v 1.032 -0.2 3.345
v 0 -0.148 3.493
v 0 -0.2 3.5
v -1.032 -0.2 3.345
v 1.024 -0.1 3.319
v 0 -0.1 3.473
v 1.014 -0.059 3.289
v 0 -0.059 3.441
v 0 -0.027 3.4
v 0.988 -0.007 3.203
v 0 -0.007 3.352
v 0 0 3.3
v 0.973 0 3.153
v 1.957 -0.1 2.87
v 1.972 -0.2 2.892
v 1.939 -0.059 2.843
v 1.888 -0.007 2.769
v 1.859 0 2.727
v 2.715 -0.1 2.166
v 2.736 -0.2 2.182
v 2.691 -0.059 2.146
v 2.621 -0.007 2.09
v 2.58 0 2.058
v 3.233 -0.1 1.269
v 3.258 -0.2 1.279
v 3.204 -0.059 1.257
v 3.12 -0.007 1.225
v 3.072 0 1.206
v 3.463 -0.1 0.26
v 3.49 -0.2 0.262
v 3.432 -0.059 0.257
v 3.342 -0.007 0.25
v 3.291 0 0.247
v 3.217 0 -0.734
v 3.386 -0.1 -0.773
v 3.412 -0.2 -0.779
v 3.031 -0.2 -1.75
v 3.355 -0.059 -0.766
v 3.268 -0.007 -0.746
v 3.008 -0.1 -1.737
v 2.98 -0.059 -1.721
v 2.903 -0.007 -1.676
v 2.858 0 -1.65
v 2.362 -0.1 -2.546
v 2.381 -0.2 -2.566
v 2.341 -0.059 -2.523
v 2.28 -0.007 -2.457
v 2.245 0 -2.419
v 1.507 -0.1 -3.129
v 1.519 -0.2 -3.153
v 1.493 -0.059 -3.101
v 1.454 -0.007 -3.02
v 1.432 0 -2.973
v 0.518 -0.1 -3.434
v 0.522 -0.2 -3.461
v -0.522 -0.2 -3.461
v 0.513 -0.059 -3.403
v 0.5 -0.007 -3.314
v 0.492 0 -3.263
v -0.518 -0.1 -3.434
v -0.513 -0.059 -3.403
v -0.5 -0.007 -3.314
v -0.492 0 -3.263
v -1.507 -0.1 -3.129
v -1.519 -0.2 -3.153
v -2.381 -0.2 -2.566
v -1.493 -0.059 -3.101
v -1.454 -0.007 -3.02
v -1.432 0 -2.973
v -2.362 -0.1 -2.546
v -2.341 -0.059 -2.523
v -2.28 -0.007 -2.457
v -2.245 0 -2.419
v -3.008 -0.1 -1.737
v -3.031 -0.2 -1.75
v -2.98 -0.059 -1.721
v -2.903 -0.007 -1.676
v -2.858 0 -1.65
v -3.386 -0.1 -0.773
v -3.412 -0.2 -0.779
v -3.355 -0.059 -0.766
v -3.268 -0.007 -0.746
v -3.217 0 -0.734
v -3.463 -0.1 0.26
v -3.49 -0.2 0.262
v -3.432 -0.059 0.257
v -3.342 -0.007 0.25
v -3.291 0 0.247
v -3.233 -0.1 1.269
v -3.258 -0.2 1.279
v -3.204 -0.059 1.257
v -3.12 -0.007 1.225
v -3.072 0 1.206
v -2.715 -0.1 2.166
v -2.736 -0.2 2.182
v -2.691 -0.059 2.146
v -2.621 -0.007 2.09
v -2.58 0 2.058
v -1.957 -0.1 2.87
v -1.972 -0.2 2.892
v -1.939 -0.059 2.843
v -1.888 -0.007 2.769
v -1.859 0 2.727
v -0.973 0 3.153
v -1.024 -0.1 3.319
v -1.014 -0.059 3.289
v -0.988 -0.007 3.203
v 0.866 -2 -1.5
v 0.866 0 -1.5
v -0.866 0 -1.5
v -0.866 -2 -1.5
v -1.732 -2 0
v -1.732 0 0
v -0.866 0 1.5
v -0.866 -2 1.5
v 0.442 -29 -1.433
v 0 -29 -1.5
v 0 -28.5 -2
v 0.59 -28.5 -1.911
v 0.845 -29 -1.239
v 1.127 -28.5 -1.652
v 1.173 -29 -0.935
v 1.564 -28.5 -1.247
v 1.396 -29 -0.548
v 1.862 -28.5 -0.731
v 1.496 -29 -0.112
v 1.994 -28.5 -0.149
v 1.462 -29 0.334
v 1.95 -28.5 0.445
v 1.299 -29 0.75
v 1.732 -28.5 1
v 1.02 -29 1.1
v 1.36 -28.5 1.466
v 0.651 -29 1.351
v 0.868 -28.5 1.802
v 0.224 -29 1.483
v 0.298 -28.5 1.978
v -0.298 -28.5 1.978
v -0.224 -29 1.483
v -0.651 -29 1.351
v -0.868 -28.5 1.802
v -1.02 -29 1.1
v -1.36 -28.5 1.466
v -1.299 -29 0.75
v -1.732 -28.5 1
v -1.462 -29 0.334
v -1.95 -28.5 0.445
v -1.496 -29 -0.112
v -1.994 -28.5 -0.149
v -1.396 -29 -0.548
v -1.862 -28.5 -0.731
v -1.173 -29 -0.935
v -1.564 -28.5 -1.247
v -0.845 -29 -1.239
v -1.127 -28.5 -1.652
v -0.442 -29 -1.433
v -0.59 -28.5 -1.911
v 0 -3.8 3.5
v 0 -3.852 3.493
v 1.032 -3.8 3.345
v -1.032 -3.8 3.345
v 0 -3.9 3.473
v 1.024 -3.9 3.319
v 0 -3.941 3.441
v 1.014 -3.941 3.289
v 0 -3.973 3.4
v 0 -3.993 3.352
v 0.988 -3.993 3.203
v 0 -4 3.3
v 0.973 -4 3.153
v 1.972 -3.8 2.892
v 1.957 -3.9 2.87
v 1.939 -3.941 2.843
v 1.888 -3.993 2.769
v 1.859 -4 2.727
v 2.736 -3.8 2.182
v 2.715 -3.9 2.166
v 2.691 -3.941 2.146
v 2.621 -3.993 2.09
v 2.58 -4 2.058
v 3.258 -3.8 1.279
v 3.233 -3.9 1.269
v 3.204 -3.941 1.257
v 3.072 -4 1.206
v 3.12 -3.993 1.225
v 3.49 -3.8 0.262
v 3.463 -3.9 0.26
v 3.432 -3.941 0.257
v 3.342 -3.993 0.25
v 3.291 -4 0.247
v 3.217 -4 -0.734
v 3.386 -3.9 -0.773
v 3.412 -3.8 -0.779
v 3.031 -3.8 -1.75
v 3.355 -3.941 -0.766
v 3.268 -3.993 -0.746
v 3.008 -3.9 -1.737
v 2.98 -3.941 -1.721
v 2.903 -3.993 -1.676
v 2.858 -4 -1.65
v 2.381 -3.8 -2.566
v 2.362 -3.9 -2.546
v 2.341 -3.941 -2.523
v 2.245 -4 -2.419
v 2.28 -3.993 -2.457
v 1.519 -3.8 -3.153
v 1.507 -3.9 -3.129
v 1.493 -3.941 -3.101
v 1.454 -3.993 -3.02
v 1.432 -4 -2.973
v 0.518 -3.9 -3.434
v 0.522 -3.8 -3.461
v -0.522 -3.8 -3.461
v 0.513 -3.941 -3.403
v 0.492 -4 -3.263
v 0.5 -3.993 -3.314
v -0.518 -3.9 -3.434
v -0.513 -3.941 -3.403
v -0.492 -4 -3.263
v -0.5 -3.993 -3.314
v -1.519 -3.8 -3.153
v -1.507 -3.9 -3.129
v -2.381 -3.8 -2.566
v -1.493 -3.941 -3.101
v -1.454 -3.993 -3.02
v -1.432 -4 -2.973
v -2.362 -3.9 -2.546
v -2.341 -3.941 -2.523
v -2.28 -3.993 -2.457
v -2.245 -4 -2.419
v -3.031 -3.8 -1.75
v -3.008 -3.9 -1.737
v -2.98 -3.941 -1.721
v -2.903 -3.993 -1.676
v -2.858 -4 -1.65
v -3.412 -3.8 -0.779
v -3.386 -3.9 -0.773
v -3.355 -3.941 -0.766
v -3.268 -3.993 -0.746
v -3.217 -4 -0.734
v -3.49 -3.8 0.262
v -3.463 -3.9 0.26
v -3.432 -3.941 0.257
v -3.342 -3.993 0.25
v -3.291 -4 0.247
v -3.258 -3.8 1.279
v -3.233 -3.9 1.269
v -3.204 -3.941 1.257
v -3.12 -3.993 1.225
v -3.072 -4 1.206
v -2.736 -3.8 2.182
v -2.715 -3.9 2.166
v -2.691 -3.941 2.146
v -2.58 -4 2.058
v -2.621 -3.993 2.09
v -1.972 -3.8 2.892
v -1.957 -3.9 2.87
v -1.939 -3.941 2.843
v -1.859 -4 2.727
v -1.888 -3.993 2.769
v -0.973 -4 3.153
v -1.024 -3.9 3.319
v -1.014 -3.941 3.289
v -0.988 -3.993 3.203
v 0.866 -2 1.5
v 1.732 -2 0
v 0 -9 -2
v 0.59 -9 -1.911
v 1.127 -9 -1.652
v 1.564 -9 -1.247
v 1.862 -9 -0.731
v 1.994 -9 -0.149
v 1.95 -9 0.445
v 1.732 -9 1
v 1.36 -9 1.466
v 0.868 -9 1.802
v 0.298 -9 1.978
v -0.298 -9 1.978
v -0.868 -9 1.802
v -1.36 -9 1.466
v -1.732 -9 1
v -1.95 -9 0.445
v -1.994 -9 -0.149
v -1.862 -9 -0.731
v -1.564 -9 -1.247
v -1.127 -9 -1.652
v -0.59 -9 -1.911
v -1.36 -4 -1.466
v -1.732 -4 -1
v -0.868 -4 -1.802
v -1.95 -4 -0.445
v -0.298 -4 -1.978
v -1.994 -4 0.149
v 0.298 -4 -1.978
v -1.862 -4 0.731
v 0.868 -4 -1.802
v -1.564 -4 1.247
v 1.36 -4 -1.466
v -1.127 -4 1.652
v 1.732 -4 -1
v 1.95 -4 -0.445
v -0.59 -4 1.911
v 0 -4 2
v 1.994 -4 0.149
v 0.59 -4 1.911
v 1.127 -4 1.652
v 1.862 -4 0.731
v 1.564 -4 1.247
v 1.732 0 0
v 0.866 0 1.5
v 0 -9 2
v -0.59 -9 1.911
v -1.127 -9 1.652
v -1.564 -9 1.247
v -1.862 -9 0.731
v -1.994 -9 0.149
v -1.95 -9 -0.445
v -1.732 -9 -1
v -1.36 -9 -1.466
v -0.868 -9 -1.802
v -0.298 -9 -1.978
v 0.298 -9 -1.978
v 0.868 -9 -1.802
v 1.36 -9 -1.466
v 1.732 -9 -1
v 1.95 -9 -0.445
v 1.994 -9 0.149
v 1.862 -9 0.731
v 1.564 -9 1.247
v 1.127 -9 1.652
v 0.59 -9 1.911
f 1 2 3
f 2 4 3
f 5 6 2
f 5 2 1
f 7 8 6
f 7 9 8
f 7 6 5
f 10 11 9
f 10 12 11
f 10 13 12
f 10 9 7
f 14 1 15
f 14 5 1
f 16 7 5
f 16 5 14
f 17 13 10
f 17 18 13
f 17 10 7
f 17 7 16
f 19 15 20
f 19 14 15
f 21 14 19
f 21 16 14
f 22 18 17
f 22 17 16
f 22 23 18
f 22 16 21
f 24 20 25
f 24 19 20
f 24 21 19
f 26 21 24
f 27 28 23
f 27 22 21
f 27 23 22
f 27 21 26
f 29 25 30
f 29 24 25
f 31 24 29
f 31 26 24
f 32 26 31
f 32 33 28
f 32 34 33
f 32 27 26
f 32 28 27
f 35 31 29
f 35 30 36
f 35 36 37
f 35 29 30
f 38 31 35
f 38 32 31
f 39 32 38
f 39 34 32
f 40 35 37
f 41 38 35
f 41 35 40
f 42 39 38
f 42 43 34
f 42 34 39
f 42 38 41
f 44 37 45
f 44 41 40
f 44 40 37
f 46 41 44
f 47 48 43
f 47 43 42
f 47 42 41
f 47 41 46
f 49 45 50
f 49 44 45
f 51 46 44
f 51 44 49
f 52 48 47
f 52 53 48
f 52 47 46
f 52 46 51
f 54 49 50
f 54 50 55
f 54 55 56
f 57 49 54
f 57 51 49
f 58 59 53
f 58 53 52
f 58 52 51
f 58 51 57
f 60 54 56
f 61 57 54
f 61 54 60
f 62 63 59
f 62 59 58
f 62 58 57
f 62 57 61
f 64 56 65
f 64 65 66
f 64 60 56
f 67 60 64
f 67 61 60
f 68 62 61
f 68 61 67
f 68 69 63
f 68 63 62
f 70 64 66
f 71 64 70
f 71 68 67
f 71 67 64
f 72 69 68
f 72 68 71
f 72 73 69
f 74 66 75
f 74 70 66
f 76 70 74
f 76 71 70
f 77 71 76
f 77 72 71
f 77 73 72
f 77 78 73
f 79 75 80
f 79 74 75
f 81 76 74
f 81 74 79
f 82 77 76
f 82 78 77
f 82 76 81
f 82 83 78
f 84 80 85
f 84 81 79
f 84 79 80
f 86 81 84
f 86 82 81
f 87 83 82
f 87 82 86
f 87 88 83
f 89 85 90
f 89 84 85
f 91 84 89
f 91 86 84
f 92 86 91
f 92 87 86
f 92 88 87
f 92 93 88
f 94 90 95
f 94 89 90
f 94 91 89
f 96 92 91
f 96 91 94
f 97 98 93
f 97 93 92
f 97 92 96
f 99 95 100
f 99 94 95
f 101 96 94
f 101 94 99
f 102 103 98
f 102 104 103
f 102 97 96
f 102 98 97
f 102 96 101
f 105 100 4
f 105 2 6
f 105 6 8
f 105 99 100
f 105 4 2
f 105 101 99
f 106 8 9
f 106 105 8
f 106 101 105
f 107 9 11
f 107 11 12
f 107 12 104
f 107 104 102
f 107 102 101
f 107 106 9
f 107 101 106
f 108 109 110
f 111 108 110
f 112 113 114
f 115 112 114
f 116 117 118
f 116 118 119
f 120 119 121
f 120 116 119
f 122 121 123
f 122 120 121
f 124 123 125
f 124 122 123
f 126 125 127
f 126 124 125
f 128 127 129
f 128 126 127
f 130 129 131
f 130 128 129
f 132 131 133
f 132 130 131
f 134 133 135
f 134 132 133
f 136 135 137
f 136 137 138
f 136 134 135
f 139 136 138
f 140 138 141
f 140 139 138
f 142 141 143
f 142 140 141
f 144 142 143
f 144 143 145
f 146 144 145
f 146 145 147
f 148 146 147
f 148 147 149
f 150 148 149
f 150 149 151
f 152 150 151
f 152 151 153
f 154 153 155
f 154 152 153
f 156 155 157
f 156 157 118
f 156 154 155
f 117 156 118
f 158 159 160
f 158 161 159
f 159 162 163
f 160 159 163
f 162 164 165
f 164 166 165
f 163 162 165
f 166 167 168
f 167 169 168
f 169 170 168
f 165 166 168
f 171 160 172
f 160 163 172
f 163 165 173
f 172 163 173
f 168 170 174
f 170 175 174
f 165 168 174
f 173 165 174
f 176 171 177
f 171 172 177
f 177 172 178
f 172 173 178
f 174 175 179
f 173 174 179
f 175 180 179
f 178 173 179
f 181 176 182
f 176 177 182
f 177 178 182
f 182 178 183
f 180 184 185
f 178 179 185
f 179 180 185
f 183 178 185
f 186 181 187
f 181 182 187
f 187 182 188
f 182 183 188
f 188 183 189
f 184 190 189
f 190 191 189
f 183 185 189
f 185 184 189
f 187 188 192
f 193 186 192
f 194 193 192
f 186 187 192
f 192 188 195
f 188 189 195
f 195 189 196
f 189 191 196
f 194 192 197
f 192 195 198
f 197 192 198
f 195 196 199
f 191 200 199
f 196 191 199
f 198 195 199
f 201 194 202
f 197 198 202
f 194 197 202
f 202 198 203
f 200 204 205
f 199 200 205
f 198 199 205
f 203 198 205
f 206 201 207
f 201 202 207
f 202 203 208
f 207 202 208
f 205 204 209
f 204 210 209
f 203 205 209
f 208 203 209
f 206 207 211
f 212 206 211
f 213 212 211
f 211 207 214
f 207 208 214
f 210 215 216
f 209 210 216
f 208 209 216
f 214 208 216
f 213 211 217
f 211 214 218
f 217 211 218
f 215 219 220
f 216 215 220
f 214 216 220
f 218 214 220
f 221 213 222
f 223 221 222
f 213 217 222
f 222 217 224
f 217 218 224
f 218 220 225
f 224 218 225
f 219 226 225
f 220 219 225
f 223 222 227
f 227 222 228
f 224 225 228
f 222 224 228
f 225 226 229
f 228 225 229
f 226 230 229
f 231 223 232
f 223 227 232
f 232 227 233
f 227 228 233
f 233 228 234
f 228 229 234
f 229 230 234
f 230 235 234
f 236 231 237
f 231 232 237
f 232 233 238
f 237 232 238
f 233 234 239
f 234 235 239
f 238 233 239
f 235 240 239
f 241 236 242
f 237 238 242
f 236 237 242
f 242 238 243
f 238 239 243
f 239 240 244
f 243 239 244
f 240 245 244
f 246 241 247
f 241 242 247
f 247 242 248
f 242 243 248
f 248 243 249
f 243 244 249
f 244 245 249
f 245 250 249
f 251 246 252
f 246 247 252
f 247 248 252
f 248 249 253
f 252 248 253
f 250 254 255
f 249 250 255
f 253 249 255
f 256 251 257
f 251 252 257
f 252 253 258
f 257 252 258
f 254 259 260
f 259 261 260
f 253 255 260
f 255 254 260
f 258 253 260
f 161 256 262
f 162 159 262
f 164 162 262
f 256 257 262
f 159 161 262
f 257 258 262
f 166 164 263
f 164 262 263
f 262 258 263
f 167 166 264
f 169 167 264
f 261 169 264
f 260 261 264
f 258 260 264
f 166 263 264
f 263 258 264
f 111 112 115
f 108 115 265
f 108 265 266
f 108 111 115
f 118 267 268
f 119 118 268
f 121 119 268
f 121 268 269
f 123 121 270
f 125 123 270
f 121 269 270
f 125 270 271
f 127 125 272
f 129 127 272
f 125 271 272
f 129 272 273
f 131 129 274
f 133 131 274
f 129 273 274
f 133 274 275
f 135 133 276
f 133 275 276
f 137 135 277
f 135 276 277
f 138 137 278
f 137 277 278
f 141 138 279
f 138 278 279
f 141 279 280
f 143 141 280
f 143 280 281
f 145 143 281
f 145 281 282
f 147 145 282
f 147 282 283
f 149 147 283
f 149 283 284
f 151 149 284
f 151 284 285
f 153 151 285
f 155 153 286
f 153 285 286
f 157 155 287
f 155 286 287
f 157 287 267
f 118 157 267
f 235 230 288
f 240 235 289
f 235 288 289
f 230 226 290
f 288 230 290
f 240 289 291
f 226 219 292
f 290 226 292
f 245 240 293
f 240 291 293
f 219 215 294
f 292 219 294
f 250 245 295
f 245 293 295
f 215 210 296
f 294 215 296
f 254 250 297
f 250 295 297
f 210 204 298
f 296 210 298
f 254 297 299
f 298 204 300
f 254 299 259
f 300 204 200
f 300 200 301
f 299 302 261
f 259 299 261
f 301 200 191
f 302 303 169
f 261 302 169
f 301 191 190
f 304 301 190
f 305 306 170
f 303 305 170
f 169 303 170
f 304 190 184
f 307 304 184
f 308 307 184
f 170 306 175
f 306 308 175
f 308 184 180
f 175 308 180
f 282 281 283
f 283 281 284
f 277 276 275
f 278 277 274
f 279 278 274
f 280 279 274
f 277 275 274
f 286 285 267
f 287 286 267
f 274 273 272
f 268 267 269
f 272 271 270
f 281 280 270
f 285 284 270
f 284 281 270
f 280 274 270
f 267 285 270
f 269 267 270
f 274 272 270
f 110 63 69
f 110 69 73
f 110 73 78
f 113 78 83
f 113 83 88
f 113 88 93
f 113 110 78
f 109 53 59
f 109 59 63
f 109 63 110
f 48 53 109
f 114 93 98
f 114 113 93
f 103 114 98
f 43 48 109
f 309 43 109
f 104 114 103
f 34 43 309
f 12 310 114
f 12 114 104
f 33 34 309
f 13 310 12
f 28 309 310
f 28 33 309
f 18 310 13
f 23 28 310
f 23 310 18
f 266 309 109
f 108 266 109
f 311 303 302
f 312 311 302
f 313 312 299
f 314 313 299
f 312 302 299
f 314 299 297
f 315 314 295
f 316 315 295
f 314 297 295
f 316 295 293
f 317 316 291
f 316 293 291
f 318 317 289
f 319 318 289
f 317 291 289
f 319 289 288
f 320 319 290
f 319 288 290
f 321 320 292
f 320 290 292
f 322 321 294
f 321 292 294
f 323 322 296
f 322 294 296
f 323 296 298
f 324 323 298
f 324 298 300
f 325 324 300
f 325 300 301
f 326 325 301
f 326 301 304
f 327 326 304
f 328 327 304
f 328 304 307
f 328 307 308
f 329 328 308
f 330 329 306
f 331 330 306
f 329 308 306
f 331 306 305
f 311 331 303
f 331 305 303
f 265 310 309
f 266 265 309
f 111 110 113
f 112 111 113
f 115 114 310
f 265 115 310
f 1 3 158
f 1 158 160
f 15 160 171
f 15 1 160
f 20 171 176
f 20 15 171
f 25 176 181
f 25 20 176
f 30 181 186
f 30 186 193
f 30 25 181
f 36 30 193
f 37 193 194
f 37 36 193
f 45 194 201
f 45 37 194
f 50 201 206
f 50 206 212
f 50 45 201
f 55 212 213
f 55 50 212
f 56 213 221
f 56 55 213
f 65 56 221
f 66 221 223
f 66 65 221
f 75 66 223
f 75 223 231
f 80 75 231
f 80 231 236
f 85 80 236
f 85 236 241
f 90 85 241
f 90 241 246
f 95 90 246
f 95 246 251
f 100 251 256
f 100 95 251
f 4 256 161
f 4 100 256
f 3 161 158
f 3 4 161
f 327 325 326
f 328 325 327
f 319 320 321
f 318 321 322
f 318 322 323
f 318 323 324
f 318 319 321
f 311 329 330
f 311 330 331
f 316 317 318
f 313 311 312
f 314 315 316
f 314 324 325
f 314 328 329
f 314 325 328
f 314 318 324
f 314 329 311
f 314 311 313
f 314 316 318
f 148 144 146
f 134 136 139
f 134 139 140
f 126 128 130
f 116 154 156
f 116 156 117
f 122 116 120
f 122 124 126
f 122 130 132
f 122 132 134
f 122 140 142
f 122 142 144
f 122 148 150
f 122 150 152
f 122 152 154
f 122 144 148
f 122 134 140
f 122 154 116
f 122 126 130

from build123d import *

# Parameters (mm, degrees)
SKETCH1_R           = 3.5
BOSS_EXTRUDE1_DEPTH = 4
CUT_EXTRUDE1_DEPTH  = 2
SKETCH3_R           = 2
BOSS_EXTRUDE2_DEPTH = 5
SKETCH4_R           = 2
BOSS_EXTRUDE3_DEPTH = 20
CHAMFER1_SIZE       = 0.5
FILLET1_R           = 0.2


with BuildPart() as part:
    # Sketch1 → Boss-Extrude1 (new body)
    with BuildSketch(Plane(origin=(0, 0, 0), x_dir=(1, 0, 0), z_dir=(0, 1, 0))):
        with Locations(Location((0, 0, 0), (0, 0, 270))):
            Circle(SKETCH1_R)
    extrude(amount=-BOSS_EXTRUDE1_DEPTH)

    # Sketch2 → Cut-Extrude1 (cut)
    with BuildSketch(Plane(origin=(0, 0, 0), x_dir=(1, 0, 0), z_dir=(0, 1, 0))):
        Polygon((1.732050808, 0), (0.866025404, 1.5), (-0.866025404, 1.5), (-1.732050808, 0), (-0.866025404, -1.5), (0.866025404, -1.5), align=None)
    extrude(amount=-CUT_EXTRUDE1_DEPTH, mode=Mode.SUBTRACT)

    # Sketch3 → Boss-Extrude2 (add)
    with BuildSketch(Plane.XZ.offset(4)):
        with Locations(Location((0, 0, 0), (0, 0, 90))):
            Circle(SKETCH3_R)
    extrude(amount=BOSS_EXTRUDE2_DEPTH)

    # Fillet1
    fillet1_edges = [part.edges().sort_by_distance(p)[0] for p in [
        (0, 0, -3.5),
        (0, -4, -3.5),
    ]]
    fillet(fillet1_edges, radius=FILLET1_R)


with BuildPart() as body_2:
    # Sketch4 → Boss-Extrude3 (new body)
    with BuildSketch(Plane.XZ.offset(9)):
        with Locations(Location((0, 0, 0), (0, 0, 270))):
            Circle(SKETCH4_R)
    extrude(amount=BOSS_EXTRUDE3_DEPTH)

    # Chamfer1
    chamfer1_edges = [body_2.edges().sort_by_distance(p)[0] for p in [
        (0, -29, 2),
    ]]
    chamfer(chamfer1_edges, length=CHAMFER1_SIZE)


solid = Compound([part.part, body_2.part])
